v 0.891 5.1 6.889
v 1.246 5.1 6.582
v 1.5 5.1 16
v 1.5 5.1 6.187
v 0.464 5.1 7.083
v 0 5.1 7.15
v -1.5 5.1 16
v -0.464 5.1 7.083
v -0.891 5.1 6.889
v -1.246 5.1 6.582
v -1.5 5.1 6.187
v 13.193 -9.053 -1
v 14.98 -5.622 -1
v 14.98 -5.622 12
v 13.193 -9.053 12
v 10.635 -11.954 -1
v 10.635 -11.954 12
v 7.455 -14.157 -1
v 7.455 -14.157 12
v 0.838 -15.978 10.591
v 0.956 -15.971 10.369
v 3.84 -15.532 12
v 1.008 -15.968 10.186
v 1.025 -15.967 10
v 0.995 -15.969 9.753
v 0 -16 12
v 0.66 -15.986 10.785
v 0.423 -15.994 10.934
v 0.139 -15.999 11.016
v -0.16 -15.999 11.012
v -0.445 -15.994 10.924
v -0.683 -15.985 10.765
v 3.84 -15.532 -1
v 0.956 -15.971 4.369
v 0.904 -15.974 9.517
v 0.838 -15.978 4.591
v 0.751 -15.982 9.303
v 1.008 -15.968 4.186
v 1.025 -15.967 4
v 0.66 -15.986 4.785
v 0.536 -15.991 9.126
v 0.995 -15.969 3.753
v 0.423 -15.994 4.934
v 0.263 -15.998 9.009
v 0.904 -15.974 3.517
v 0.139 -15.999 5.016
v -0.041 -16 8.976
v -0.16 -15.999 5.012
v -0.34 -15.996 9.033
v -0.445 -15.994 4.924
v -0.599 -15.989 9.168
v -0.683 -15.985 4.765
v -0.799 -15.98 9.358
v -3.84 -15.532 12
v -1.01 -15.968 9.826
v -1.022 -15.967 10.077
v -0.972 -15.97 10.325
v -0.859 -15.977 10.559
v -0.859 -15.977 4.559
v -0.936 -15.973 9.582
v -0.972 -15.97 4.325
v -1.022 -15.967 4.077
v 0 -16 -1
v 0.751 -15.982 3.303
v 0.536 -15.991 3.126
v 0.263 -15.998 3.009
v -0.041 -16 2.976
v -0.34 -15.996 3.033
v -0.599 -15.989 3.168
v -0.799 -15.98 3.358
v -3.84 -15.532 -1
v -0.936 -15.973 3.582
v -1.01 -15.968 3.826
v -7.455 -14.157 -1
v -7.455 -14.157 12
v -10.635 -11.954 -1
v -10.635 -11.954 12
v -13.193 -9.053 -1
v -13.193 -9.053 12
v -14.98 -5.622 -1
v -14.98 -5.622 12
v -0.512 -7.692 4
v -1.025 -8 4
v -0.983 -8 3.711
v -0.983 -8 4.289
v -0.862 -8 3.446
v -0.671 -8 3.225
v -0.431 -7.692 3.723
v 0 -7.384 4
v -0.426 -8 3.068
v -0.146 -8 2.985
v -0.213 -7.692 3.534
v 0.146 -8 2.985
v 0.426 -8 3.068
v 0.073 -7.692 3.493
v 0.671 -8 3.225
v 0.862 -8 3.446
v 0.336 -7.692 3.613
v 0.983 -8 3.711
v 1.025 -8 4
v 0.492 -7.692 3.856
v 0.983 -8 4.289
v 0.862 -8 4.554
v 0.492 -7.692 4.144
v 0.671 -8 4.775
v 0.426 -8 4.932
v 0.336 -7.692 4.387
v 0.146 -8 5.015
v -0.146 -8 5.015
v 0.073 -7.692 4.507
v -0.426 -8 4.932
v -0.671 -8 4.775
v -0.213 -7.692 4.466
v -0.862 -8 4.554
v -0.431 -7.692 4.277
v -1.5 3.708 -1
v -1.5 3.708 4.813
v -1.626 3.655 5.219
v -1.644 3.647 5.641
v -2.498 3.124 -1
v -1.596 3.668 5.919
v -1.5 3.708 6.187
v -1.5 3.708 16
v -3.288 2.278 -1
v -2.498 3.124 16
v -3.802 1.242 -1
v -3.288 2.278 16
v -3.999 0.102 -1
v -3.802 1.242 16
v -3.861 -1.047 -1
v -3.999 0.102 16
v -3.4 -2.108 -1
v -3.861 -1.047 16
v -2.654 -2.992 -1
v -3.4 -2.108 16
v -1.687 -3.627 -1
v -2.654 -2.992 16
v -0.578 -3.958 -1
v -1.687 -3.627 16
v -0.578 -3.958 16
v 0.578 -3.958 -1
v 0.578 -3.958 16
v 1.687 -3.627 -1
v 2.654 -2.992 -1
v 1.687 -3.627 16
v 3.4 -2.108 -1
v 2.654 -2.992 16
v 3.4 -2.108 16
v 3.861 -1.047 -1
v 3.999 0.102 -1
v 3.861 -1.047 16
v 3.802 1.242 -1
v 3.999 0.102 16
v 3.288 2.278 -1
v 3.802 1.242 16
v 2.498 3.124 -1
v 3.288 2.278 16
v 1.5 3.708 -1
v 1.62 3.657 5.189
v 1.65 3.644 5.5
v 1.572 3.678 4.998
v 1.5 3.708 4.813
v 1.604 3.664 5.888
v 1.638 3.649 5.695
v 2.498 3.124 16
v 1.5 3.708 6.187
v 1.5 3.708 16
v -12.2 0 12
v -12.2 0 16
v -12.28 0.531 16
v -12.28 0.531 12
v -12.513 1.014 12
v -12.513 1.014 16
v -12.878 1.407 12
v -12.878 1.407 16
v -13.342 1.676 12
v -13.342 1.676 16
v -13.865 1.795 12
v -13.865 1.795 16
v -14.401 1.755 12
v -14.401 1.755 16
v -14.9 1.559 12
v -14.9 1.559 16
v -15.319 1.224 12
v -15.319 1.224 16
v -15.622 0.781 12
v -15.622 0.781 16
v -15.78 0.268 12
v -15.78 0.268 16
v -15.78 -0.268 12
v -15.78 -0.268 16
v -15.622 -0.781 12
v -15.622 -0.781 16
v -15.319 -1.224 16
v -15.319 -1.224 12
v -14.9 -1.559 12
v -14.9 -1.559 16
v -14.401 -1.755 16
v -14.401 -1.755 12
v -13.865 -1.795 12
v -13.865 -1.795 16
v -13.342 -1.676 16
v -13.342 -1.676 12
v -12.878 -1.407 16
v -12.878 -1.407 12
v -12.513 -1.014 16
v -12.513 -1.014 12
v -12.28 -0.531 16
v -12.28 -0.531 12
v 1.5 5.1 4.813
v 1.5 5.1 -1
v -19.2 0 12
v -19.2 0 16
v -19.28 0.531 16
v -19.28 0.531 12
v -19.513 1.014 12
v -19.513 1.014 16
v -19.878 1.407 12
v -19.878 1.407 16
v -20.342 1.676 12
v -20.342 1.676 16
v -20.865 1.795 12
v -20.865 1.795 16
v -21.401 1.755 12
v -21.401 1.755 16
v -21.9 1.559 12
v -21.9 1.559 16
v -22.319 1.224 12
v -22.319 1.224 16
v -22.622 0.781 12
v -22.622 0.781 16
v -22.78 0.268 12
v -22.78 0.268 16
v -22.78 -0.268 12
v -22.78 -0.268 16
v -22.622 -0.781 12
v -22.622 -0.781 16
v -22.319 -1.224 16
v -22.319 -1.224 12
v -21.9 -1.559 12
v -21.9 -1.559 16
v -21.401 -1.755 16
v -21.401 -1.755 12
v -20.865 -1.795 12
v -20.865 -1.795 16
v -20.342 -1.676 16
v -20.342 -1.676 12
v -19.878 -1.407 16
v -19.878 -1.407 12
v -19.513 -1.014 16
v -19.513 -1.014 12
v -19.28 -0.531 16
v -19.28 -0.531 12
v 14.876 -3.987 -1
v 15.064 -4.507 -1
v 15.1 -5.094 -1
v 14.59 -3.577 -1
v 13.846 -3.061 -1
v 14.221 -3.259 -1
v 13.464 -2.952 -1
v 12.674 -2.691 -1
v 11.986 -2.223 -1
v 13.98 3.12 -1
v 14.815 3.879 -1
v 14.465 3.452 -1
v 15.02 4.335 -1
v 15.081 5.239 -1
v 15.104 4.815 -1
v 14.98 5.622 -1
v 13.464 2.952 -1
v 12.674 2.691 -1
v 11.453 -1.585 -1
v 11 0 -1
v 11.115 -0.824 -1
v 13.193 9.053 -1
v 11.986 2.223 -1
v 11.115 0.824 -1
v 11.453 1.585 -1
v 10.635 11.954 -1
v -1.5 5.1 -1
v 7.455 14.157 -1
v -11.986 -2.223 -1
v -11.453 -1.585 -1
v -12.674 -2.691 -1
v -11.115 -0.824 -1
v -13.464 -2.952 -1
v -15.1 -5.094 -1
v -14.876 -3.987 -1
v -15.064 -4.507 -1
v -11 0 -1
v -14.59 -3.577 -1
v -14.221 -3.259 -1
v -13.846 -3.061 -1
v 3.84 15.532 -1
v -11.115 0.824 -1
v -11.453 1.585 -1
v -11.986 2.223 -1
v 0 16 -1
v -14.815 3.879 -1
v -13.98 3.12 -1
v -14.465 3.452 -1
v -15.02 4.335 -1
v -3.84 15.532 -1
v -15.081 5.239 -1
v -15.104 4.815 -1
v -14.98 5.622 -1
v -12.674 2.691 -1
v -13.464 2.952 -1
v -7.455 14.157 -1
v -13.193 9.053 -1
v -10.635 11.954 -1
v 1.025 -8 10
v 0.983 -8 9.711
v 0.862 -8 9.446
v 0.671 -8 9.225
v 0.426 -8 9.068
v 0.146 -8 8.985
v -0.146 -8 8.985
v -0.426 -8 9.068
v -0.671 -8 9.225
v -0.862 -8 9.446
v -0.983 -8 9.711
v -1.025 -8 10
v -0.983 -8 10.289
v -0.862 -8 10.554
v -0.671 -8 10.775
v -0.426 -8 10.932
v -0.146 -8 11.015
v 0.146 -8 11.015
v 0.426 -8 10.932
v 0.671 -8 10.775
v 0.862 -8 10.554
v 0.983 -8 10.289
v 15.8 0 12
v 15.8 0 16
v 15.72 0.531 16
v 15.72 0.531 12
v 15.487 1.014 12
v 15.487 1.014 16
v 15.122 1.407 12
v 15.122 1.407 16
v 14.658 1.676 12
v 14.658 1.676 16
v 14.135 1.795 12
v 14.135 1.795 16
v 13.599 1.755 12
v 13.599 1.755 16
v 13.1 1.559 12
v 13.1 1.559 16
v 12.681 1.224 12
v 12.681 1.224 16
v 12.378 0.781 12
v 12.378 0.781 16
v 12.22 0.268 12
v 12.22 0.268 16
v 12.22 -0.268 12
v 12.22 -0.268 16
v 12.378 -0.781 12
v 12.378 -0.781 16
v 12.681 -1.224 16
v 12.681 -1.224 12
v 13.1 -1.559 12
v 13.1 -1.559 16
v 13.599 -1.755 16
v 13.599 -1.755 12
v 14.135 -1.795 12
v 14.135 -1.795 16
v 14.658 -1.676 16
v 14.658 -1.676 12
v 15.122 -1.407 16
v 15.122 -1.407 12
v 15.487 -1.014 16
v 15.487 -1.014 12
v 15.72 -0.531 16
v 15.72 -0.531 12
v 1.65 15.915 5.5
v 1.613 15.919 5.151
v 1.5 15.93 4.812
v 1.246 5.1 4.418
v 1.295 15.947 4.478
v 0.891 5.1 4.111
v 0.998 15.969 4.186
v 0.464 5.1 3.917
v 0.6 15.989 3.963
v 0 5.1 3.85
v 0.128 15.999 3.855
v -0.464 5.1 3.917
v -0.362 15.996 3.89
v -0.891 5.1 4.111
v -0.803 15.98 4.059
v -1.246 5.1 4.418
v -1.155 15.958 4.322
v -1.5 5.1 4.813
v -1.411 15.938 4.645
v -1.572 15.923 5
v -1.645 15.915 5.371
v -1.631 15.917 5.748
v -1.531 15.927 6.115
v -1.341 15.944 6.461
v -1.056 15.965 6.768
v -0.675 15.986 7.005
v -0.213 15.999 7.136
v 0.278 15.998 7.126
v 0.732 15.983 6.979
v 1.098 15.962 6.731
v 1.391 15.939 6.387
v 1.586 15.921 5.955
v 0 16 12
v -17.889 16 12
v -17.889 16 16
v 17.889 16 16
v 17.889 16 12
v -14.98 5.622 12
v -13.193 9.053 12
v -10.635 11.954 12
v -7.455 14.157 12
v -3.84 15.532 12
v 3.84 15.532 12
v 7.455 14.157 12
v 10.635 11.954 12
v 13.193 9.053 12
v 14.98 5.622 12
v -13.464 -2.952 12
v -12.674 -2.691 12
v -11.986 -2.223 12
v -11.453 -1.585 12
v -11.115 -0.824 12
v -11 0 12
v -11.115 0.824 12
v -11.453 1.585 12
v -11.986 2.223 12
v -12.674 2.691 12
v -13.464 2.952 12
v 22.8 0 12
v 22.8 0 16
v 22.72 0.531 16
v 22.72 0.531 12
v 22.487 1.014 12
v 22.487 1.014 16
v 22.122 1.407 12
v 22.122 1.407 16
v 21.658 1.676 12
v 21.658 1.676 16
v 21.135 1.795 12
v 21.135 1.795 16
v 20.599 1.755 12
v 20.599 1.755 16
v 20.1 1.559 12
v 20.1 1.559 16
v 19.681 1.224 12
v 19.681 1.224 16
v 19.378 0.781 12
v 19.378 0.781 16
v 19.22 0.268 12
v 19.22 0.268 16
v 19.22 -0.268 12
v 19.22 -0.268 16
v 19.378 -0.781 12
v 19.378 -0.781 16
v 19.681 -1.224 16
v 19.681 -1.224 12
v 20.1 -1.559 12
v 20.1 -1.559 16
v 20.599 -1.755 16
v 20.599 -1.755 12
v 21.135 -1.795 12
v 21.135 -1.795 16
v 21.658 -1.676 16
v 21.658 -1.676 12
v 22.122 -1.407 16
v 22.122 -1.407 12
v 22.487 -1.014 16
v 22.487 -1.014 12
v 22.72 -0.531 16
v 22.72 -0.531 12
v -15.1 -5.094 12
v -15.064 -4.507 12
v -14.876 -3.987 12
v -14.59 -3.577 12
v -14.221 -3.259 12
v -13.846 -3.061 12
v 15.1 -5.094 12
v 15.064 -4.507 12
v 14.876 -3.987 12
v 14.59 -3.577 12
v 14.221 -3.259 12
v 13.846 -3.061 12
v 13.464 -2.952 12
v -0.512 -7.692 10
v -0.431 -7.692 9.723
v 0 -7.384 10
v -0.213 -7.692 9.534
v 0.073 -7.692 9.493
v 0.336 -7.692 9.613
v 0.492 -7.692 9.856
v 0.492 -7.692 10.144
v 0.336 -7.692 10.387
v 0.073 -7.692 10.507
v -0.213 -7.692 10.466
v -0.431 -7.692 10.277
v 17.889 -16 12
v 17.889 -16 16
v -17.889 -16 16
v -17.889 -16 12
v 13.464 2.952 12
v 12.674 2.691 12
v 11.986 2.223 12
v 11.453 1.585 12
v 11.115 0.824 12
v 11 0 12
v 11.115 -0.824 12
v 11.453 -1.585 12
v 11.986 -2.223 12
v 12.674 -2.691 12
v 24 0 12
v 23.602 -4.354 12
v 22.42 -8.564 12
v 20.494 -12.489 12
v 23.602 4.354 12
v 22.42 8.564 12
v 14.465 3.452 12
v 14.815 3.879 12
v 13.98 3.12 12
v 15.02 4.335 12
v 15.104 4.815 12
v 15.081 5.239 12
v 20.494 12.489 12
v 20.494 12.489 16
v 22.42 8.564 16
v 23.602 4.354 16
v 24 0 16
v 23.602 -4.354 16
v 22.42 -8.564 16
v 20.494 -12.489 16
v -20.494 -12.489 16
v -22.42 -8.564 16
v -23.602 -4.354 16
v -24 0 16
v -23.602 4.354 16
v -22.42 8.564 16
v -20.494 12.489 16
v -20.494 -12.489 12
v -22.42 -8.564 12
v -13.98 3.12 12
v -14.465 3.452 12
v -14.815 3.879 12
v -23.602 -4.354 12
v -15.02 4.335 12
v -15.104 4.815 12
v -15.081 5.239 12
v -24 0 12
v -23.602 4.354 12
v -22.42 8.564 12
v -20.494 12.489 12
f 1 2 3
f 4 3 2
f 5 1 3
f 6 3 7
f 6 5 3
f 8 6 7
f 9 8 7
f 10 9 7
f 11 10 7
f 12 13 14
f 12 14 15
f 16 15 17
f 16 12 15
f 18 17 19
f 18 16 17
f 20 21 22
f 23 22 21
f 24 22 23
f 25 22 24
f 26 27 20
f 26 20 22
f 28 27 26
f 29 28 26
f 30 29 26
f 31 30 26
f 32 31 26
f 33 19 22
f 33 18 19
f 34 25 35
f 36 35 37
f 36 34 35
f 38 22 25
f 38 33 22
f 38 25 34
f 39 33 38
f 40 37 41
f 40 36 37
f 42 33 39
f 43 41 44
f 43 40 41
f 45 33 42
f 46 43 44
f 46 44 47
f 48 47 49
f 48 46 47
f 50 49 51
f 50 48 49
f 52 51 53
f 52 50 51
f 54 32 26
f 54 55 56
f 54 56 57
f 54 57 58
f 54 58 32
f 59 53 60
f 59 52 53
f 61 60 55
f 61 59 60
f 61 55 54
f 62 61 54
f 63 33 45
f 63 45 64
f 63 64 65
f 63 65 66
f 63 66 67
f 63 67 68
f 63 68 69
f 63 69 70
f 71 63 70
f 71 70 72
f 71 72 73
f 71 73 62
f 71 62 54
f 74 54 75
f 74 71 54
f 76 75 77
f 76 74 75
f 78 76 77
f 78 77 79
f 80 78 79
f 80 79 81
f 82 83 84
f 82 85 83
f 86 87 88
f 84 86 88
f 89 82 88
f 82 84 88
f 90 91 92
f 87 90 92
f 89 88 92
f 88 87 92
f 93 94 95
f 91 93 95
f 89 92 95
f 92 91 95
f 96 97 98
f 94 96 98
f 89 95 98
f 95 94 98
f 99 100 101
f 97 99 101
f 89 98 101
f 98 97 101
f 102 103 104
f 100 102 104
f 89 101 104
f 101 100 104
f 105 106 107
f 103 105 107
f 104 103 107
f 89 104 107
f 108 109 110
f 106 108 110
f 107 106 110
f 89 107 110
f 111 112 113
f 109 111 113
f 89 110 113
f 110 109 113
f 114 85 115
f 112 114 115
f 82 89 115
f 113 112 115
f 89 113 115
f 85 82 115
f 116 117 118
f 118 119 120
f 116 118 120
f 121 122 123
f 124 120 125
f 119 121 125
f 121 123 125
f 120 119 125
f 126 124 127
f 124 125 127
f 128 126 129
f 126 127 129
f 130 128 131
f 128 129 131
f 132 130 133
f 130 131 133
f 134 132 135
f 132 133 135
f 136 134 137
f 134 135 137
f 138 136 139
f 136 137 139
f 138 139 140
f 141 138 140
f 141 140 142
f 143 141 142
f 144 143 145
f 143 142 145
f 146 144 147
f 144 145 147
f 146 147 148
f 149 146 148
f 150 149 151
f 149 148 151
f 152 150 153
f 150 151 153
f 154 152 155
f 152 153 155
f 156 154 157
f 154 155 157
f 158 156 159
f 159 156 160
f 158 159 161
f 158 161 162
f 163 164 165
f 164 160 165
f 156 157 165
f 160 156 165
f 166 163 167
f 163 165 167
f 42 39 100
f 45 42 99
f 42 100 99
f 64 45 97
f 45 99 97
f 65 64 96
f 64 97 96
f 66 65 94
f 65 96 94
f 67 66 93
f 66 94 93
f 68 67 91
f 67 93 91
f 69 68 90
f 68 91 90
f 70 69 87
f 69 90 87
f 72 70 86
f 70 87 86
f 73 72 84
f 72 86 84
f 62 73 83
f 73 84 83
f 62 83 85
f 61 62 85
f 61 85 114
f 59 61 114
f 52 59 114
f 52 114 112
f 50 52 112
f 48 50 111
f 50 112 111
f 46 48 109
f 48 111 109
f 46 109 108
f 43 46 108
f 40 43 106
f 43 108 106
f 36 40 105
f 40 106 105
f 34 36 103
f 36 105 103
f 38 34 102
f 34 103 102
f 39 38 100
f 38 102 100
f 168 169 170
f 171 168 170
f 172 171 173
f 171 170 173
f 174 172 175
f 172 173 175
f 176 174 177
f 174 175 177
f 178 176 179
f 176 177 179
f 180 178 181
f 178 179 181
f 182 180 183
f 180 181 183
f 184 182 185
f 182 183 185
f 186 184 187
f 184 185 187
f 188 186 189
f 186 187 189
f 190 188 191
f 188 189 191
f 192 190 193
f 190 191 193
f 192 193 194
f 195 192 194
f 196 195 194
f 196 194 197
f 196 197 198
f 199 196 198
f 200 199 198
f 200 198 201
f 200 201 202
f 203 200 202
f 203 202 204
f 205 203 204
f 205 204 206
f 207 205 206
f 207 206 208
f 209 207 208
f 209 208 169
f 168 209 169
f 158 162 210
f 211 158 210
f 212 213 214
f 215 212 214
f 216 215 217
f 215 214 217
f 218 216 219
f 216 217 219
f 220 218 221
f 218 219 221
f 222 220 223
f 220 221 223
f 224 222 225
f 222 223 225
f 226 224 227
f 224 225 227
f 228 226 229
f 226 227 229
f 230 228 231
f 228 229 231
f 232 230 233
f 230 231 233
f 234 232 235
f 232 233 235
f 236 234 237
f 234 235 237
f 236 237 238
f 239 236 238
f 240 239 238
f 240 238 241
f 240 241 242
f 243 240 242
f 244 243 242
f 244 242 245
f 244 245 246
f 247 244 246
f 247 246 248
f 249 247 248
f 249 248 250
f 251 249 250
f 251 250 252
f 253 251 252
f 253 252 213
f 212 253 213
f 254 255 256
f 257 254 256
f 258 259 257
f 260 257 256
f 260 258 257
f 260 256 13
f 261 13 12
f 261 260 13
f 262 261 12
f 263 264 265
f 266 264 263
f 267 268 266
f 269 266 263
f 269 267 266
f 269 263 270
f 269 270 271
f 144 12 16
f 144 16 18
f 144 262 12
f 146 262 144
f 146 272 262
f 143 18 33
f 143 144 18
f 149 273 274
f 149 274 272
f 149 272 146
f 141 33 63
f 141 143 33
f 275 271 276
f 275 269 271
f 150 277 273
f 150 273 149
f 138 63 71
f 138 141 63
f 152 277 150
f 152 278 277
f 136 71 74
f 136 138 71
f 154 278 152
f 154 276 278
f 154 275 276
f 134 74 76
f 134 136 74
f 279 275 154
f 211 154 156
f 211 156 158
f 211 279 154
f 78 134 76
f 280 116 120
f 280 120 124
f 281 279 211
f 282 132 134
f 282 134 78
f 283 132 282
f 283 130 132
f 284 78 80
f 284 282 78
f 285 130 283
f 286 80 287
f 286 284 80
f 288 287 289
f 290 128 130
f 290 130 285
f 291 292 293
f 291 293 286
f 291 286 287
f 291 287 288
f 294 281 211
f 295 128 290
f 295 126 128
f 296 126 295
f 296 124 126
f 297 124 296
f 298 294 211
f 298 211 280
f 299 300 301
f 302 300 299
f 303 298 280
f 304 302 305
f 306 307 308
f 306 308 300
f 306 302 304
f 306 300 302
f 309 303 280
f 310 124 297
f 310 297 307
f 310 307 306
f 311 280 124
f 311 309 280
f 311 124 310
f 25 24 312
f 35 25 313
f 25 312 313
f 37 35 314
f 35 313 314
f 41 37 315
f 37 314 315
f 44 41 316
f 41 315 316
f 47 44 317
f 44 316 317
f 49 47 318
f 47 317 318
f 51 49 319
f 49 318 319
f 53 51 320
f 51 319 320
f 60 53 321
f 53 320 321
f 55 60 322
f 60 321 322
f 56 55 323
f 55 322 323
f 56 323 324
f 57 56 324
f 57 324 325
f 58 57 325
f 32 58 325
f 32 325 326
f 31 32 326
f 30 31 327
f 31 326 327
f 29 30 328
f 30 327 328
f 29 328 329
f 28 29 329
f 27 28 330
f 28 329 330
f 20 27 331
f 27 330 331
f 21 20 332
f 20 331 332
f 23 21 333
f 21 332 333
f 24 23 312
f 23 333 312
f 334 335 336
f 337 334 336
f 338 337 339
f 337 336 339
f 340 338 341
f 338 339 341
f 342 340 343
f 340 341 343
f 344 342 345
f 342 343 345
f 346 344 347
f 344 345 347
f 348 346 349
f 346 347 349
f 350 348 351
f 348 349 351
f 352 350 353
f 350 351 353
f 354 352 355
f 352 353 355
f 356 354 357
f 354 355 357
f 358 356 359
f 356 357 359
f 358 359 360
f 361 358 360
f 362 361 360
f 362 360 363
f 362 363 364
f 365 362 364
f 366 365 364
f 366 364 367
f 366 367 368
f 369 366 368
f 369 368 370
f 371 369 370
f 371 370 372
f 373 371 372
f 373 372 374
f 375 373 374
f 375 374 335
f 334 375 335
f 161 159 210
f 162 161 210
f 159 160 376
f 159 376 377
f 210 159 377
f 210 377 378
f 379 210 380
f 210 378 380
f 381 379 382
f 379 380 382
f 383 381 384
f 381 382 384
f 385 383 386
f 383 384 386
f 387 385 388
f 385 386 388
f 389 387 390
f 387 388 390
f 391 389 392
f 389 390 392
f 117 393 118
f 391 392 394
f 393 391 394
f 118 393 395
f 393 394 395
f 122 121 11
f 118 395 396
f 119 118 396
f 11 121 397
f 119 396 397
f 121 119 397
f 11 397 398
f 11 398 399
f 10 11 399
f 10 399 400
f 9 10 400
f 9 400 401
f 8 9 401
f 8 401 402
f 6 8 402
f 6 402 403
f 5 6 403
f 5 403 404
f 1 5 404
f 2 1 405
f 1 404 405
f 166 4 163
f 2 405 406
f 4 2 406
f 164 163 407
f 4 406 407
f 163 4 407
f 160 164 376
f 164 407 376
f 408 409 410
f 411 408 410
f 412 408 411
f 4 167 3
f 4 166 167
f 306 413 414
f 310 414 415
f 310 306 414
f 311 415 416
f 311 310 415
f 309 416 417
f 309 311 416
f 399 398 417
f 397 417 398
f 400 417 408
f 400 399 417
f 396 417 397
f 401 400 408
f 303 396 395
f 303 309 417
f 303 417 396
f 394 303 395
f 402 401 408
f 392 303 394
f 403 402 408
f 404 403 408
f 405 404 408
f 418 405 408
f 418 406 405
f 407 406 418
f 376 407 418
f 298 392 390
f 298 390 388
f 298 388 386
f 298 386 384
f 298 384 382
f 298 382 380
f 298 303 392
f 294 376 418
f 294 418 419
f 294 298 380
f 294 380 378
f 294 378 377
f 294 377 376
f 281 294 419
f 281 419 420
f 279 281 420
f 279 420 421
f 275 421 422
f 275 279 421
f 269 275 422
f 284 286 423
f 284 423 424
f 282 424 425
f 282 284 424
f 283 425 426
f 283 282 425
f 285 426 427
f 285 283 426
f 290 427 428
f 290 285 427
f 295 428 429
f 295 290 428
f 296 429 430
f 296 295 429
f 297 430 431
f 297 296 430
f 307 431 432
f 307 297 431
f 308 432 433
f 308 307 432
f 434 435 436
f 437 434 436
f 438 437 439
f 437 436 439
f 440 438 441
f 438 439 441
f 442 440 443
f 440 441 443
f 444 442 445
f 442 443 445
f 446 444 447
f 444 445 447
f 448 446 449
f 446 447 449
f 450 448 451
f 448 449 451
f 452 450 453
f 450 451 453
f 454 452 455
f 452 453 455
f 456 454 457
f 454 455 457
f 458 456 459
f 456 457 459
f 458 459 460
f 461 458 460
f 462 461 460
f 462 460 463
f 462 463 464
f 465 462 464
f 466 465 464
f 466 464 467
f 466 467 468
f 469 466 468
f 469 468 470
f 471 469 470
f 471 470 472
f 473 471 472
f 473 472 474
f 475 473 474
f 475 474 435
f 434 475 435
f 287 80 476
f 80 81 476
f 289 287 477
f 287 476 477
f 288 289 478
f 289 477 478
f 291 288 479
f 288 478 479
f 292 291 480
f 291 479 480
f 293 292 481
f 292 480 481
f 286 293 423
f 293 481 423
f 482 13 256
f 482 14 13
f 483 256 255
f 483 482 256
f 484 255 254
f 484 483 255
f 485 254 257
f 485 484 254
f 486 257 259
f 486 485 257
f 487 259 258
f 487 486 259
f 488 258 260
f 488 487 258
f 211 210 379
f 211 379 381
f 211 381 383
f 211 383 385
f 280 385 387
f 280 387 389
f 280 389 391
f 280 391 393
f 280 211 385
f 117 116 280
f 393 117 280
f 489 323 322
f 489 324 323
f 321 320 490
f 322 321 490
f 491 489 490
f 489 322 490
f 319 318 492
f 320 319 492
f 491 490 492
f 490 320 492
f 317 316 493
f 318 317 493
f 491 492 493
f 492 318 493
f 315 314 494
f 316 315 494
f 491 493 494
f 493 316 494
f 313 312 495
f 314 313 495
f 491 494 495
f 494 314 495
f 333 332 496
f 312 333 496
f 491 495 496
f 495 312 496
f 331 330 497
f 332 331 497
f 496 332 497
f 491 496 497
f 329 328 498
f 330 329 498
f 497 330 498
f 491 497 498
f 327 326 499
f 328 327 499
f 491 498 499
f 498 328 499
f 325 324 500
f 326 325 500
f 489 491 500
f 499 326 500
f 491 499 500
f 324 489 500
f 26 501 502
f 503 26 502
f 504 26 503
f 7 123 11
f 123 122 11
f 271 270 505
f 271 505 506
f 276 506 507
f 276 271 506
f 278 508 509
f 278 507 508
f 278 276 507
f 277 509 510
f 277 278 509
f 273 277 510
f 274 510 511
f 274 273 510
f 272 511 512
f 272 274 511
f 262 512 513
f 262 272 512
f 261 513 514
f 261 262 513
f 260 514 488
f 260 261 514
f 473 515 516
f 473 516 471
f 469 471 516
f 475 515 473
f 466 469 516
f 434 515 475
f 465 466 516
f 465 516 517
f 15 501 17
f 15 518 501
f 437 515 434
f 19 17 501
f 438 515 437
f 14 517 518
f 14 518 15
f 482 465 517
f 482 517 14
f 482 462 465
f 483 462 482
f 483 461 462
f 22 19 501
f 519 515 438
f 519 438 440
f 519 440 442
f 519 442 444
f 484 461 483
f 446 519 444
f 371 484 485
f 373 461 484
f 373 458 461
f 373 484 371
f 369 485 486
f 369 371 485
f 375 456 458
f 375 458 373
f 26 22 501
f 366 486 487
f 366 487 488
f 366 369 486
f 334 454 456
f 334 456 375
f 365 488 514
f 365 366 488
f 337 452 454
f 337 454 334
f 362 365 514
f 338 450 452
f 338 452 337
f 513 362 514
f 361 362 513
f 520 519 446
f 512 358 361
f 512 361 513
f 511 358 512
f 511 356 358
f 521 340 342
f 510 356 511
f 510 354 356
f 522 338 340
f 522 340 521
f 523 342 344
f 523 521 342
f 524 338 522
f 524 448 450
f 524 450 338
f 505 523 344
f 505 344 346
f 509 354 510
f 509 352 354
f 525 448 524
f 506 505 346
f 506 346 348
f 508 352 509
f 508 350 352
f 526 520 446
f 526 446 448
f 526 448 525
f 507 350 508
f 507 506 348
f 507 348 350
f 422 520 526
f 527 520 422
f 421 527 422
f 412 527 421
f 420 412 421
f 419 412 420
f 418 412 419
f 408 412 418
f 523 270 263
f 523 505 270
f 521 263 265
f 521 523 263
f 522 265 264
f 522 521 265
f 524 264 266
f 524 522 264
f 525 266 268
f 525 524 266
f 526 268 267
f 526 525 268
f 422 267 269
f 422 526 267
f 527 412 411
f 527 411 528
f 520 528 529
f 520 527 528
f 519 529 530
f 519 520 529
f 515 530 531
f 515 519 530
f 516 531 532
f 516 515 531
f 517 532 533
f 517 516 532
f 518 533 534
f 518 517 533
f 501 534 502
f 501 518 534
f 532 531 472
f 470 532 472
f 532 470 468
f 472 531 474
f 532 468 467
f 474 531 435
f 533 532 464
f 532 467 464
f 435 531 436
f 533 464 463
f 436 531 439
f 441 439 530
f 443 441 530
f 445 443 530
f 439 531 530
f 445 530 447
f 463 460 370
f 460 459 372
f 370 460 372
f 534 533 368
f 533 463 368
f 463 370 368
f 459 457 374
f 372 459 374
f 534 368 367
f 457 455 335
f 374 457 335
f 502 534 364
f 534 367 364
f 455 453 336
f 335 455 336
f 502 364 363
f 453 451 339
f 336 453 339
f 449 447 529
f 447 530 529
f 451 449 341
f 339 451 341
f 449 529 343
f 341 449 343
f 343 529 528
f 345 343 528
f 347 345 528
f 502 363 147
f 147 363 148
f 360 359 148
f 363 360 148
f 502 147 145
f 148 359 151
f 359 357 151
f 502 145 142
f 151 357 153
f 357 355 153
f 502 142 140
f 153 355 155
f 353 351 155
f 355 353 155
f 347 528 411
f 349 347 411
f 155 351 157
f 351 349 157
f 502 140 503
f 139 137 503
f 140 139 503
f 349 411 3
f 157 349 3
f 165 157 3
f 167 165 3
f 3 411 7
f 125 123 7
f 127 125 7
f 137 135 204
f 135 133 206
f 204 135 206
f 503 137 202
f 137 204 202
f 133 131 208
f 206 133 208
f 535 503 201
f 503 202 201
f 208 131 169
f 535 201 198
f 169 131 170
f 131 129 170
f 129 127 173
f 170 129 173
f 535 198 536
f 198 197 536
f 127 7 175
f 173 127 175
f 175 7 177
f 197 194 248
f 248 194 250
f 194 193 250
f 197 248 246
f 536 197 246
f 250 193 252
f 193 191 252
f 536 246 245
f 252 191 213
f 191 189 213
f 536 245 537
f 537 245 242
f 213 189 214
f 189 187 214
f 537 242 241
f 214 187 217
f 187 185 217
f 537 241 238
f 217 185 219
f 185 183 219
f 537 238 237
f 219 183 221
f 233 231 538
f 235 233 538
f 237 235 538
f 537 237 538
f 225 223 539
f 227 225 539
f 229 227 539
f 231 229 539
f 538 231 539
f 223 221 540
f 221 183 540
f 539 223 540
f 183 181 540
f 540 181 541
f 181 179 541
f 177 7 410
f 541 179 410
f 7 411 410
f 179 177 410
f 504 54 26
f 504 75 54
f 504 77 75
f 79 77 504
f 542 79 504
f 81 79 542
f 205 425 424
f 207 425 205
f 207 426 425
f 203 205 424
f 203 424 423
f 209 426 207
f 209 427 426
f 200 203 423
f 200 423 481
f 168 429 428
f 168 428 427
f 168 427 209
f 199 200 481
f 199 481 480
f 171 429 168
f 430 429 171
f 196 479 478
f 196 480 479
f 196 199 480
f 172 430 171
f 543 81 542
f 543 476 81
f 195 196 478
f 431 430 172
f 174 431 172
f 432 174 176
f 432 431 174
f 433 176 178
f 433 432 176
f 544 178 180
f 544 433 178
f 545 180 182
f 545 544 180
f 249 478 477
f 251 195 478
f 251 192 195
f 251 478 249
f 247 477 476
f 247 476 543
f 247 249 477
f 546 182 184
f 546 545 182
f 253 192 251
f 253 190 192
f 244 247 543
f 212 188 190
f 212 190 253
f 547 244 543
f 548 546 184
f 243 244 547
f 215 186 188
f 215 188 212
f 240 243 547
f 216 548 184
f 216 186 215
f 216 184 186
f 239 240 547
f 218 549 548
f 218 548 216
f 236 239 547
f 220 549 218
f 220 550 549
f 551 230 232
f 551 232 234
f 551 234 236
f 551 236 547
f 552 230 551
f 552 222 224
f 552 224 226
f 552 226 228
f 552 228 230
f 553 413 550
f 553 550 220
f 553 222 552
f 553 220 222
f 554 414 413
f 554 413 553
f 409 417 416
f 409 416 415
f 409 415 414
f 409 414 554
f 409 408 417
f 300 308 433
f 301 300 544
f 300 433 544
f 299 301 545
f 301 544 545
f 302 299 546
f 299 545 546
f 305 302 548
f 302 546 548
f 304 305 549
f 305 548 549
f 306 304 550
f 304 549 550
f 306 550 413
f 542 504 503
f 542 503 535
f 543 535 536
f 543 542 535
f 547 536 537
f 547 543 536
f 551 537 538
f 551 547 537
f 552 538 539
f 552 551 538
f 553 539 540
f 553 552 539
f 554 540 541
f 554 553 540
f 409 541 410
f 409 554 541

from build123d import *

# Parameters (mm, degrees)
BOSS_EXTRUDE1_DEPTH          = 4
BOSS_EXTRUDE2_REACH          = 35.481
M3_CLEARANCE_HOLE1_D         = 3.6
F_8_0MM_DOWEL_HOLE1_D        = 8
FILLET1_R                    = 2
M4X0_7_TAPPED_HOLE1_REACH    = 45.081
M4X0_7_TAPPED_HOLE1_BORE_R   = 1.65
M2_5X0_45_TAPPED_HOLE1_D     = 2.05
M2_5X0_45_TAPPED_HOLE1_DEPTH = 8
M2_5X0_45_TAPPED_HOLE1_TIP   = 0.615882135
SKETCH14_W                   = 3
SKETCH14_H                   = 3
CUT_EXTRUDE1_DEPTH           = 34.481338272


with BuildPart() as part:
    # Sketch1 → Boss-Extrude1 (new body)
    with BuildSketch(Plane(origin=(0, 0, 12), x_dir=(-1, 0, 0), z_dir=(0, 0, -1))):
        with BuildLine():
            Line((17.88854382, 16), (-17.88854382, 16))
            ThreePointArc((-17.88854382, 16), (-24, 0), (-17.88854382, -16))
            Line((-17.88854382, -16), (17.88854382, -16))
            ThreePointArc((17.88854382, -16), (24, 0), (17.88854382, 16))
        make_face()
    extrude(amount=-BOSS_EXTRUDE1_DEPTH)

    # Sketch3 → Boss-Extrude2 (add, up to next)
    with BuildSketch(Plane(origin=(0, 0, -1), x_dir=(-1, 0, 0), z_dir=(0, 0, -1)), mode=Mode.PRIVATE) as boss_extrude2_sk1:
        with BuildLine():
            ThreePointArc((-15.821428571, -2.383778085), (0, -16), (15.821428571, -2.383778085))
            ThreePointArc((15.821428571, -2.383778085), (11, 0), (15.821428571, 2.383778085))
            ThreePointArc((15.821428571, 2.383778085), (0, 16), (-15.821428571, 2.383778085))
            ThreePointArc((-15.821428571, 2.383778085), (-11, 0), (-15.821428571, -2.383778085))
        make_face()
    boss_extrude2_tool1 = extrude(boss_extrude2_sk1.sketch, amount=-BOSS_EXTRUDE2_REACH, mode=Mode.PRIVATE) - part.part
    add(boss_extrude2_tool1.solids().sort_by_distance((0, 0, -1))[0])

    # M3 Clearance Hole1 (through all)
    with Locations(Plane(origin=(0, 0, 12), x_dir=(-1, 0, 0), z_dir=(0, 0, -1))):
        with Locations((21, 0), (-21, 0), (-14, 0), (14, 0)):
            Hole(M3_CLEARANCE_HOLE1_D / 2)

    # Ø8.0mm Dowel Hole1 (through all)
    with Locations(Plane(origin=(0, 0, -1), x_dir=(-1, 0, 0), z_dir=(0, 0, -1))):
        with Locations((0, 0)):
            Hole(F_8_0MM_DOWEL_HOLE1_D / 2)

    # Fillet1
    fillet1_edges = [part.edges().sort_by_distance(p)[0] for p in [
        (-15.821428571, -2.383778085, 5.5),
        (-15.821428571, 2.383778085, 5.5),
        (15.821428571, 2.383778085, 5.5),
        (15.821428571, -2.383778085, 5.5),
    ]]
    fillet(fillet1_edges, radius=FILLET1_R)

    # M4x0.7 Tapped Hole1 bore → M4x0.7 Tapped Hole1 (cut, up to next)
    with BuildSketch(Plane(origin=(0, 16, 0), x_dir=(1, 0, 0), z_dir=(0, 1, 0)), mode=Mode.PRIVATE) as m4x0_7_tapped_hole1_sk1:
        with Locations((0, -5.5)):
            Circle(M4X0_7_TAPPED_HOLE1_BORE_R)
    m4x0_7_tapped_hole1_tool1 = extrude(m4x0_7_tapped_hole1_sk1.sketch, amount=-M4X0_7_TAPPED_HOLE1_REACH, mode=Mode.PRIVATE) & part.part
    add(m4x0_7_tapped_hole1_tool1.solids().sort_by_distance((0, 16, 5.5))[0], mode=Mode.SUBTRACT)

    # M2.5x0.45 Tapped Hole1
    with Locations(Plane(origin=(0, -16, 0), x_dir=(-1, 0, 0), z_dir=(0, -1, 0))):
        with Locations((0, -4), (0, -10)):
            Hole(M2_5X0_45_TAPPED_HOLE1_D / 2, depth=M2_5X0_45_TAPPED_HOLE1_DEPTH)
            with Locations((0, 0, -(M2_5X0_45_TAPPED_HOLE1_DEPTH + M2_5X0_45_TAPPED_HOLE1_TIP / 2))):  # 118° drill point
                Cone(0, M2_5X0_45_TAPPED_HOLE1_D / 2, M2_5X0_45_TAPPED_HOLE1_TIP, mode=Mode.SUBTRACT)

    # Sketch14 → Cut-Extrude1 (cut, through all)
    with BuildSketch(Plane(origin=(0, 0, -1), x_dir=(-1, 0, 0), z_dir=(0, 0, -1))):
        with Locations((0, 3.6)):
            Rectangle(SKETCH14_W, SKETCH14_H)
    extrude(amount=-CUT_EXTRUDE1_DEPTH, mode=Mode.SUBTRACT)


solid = part.part
